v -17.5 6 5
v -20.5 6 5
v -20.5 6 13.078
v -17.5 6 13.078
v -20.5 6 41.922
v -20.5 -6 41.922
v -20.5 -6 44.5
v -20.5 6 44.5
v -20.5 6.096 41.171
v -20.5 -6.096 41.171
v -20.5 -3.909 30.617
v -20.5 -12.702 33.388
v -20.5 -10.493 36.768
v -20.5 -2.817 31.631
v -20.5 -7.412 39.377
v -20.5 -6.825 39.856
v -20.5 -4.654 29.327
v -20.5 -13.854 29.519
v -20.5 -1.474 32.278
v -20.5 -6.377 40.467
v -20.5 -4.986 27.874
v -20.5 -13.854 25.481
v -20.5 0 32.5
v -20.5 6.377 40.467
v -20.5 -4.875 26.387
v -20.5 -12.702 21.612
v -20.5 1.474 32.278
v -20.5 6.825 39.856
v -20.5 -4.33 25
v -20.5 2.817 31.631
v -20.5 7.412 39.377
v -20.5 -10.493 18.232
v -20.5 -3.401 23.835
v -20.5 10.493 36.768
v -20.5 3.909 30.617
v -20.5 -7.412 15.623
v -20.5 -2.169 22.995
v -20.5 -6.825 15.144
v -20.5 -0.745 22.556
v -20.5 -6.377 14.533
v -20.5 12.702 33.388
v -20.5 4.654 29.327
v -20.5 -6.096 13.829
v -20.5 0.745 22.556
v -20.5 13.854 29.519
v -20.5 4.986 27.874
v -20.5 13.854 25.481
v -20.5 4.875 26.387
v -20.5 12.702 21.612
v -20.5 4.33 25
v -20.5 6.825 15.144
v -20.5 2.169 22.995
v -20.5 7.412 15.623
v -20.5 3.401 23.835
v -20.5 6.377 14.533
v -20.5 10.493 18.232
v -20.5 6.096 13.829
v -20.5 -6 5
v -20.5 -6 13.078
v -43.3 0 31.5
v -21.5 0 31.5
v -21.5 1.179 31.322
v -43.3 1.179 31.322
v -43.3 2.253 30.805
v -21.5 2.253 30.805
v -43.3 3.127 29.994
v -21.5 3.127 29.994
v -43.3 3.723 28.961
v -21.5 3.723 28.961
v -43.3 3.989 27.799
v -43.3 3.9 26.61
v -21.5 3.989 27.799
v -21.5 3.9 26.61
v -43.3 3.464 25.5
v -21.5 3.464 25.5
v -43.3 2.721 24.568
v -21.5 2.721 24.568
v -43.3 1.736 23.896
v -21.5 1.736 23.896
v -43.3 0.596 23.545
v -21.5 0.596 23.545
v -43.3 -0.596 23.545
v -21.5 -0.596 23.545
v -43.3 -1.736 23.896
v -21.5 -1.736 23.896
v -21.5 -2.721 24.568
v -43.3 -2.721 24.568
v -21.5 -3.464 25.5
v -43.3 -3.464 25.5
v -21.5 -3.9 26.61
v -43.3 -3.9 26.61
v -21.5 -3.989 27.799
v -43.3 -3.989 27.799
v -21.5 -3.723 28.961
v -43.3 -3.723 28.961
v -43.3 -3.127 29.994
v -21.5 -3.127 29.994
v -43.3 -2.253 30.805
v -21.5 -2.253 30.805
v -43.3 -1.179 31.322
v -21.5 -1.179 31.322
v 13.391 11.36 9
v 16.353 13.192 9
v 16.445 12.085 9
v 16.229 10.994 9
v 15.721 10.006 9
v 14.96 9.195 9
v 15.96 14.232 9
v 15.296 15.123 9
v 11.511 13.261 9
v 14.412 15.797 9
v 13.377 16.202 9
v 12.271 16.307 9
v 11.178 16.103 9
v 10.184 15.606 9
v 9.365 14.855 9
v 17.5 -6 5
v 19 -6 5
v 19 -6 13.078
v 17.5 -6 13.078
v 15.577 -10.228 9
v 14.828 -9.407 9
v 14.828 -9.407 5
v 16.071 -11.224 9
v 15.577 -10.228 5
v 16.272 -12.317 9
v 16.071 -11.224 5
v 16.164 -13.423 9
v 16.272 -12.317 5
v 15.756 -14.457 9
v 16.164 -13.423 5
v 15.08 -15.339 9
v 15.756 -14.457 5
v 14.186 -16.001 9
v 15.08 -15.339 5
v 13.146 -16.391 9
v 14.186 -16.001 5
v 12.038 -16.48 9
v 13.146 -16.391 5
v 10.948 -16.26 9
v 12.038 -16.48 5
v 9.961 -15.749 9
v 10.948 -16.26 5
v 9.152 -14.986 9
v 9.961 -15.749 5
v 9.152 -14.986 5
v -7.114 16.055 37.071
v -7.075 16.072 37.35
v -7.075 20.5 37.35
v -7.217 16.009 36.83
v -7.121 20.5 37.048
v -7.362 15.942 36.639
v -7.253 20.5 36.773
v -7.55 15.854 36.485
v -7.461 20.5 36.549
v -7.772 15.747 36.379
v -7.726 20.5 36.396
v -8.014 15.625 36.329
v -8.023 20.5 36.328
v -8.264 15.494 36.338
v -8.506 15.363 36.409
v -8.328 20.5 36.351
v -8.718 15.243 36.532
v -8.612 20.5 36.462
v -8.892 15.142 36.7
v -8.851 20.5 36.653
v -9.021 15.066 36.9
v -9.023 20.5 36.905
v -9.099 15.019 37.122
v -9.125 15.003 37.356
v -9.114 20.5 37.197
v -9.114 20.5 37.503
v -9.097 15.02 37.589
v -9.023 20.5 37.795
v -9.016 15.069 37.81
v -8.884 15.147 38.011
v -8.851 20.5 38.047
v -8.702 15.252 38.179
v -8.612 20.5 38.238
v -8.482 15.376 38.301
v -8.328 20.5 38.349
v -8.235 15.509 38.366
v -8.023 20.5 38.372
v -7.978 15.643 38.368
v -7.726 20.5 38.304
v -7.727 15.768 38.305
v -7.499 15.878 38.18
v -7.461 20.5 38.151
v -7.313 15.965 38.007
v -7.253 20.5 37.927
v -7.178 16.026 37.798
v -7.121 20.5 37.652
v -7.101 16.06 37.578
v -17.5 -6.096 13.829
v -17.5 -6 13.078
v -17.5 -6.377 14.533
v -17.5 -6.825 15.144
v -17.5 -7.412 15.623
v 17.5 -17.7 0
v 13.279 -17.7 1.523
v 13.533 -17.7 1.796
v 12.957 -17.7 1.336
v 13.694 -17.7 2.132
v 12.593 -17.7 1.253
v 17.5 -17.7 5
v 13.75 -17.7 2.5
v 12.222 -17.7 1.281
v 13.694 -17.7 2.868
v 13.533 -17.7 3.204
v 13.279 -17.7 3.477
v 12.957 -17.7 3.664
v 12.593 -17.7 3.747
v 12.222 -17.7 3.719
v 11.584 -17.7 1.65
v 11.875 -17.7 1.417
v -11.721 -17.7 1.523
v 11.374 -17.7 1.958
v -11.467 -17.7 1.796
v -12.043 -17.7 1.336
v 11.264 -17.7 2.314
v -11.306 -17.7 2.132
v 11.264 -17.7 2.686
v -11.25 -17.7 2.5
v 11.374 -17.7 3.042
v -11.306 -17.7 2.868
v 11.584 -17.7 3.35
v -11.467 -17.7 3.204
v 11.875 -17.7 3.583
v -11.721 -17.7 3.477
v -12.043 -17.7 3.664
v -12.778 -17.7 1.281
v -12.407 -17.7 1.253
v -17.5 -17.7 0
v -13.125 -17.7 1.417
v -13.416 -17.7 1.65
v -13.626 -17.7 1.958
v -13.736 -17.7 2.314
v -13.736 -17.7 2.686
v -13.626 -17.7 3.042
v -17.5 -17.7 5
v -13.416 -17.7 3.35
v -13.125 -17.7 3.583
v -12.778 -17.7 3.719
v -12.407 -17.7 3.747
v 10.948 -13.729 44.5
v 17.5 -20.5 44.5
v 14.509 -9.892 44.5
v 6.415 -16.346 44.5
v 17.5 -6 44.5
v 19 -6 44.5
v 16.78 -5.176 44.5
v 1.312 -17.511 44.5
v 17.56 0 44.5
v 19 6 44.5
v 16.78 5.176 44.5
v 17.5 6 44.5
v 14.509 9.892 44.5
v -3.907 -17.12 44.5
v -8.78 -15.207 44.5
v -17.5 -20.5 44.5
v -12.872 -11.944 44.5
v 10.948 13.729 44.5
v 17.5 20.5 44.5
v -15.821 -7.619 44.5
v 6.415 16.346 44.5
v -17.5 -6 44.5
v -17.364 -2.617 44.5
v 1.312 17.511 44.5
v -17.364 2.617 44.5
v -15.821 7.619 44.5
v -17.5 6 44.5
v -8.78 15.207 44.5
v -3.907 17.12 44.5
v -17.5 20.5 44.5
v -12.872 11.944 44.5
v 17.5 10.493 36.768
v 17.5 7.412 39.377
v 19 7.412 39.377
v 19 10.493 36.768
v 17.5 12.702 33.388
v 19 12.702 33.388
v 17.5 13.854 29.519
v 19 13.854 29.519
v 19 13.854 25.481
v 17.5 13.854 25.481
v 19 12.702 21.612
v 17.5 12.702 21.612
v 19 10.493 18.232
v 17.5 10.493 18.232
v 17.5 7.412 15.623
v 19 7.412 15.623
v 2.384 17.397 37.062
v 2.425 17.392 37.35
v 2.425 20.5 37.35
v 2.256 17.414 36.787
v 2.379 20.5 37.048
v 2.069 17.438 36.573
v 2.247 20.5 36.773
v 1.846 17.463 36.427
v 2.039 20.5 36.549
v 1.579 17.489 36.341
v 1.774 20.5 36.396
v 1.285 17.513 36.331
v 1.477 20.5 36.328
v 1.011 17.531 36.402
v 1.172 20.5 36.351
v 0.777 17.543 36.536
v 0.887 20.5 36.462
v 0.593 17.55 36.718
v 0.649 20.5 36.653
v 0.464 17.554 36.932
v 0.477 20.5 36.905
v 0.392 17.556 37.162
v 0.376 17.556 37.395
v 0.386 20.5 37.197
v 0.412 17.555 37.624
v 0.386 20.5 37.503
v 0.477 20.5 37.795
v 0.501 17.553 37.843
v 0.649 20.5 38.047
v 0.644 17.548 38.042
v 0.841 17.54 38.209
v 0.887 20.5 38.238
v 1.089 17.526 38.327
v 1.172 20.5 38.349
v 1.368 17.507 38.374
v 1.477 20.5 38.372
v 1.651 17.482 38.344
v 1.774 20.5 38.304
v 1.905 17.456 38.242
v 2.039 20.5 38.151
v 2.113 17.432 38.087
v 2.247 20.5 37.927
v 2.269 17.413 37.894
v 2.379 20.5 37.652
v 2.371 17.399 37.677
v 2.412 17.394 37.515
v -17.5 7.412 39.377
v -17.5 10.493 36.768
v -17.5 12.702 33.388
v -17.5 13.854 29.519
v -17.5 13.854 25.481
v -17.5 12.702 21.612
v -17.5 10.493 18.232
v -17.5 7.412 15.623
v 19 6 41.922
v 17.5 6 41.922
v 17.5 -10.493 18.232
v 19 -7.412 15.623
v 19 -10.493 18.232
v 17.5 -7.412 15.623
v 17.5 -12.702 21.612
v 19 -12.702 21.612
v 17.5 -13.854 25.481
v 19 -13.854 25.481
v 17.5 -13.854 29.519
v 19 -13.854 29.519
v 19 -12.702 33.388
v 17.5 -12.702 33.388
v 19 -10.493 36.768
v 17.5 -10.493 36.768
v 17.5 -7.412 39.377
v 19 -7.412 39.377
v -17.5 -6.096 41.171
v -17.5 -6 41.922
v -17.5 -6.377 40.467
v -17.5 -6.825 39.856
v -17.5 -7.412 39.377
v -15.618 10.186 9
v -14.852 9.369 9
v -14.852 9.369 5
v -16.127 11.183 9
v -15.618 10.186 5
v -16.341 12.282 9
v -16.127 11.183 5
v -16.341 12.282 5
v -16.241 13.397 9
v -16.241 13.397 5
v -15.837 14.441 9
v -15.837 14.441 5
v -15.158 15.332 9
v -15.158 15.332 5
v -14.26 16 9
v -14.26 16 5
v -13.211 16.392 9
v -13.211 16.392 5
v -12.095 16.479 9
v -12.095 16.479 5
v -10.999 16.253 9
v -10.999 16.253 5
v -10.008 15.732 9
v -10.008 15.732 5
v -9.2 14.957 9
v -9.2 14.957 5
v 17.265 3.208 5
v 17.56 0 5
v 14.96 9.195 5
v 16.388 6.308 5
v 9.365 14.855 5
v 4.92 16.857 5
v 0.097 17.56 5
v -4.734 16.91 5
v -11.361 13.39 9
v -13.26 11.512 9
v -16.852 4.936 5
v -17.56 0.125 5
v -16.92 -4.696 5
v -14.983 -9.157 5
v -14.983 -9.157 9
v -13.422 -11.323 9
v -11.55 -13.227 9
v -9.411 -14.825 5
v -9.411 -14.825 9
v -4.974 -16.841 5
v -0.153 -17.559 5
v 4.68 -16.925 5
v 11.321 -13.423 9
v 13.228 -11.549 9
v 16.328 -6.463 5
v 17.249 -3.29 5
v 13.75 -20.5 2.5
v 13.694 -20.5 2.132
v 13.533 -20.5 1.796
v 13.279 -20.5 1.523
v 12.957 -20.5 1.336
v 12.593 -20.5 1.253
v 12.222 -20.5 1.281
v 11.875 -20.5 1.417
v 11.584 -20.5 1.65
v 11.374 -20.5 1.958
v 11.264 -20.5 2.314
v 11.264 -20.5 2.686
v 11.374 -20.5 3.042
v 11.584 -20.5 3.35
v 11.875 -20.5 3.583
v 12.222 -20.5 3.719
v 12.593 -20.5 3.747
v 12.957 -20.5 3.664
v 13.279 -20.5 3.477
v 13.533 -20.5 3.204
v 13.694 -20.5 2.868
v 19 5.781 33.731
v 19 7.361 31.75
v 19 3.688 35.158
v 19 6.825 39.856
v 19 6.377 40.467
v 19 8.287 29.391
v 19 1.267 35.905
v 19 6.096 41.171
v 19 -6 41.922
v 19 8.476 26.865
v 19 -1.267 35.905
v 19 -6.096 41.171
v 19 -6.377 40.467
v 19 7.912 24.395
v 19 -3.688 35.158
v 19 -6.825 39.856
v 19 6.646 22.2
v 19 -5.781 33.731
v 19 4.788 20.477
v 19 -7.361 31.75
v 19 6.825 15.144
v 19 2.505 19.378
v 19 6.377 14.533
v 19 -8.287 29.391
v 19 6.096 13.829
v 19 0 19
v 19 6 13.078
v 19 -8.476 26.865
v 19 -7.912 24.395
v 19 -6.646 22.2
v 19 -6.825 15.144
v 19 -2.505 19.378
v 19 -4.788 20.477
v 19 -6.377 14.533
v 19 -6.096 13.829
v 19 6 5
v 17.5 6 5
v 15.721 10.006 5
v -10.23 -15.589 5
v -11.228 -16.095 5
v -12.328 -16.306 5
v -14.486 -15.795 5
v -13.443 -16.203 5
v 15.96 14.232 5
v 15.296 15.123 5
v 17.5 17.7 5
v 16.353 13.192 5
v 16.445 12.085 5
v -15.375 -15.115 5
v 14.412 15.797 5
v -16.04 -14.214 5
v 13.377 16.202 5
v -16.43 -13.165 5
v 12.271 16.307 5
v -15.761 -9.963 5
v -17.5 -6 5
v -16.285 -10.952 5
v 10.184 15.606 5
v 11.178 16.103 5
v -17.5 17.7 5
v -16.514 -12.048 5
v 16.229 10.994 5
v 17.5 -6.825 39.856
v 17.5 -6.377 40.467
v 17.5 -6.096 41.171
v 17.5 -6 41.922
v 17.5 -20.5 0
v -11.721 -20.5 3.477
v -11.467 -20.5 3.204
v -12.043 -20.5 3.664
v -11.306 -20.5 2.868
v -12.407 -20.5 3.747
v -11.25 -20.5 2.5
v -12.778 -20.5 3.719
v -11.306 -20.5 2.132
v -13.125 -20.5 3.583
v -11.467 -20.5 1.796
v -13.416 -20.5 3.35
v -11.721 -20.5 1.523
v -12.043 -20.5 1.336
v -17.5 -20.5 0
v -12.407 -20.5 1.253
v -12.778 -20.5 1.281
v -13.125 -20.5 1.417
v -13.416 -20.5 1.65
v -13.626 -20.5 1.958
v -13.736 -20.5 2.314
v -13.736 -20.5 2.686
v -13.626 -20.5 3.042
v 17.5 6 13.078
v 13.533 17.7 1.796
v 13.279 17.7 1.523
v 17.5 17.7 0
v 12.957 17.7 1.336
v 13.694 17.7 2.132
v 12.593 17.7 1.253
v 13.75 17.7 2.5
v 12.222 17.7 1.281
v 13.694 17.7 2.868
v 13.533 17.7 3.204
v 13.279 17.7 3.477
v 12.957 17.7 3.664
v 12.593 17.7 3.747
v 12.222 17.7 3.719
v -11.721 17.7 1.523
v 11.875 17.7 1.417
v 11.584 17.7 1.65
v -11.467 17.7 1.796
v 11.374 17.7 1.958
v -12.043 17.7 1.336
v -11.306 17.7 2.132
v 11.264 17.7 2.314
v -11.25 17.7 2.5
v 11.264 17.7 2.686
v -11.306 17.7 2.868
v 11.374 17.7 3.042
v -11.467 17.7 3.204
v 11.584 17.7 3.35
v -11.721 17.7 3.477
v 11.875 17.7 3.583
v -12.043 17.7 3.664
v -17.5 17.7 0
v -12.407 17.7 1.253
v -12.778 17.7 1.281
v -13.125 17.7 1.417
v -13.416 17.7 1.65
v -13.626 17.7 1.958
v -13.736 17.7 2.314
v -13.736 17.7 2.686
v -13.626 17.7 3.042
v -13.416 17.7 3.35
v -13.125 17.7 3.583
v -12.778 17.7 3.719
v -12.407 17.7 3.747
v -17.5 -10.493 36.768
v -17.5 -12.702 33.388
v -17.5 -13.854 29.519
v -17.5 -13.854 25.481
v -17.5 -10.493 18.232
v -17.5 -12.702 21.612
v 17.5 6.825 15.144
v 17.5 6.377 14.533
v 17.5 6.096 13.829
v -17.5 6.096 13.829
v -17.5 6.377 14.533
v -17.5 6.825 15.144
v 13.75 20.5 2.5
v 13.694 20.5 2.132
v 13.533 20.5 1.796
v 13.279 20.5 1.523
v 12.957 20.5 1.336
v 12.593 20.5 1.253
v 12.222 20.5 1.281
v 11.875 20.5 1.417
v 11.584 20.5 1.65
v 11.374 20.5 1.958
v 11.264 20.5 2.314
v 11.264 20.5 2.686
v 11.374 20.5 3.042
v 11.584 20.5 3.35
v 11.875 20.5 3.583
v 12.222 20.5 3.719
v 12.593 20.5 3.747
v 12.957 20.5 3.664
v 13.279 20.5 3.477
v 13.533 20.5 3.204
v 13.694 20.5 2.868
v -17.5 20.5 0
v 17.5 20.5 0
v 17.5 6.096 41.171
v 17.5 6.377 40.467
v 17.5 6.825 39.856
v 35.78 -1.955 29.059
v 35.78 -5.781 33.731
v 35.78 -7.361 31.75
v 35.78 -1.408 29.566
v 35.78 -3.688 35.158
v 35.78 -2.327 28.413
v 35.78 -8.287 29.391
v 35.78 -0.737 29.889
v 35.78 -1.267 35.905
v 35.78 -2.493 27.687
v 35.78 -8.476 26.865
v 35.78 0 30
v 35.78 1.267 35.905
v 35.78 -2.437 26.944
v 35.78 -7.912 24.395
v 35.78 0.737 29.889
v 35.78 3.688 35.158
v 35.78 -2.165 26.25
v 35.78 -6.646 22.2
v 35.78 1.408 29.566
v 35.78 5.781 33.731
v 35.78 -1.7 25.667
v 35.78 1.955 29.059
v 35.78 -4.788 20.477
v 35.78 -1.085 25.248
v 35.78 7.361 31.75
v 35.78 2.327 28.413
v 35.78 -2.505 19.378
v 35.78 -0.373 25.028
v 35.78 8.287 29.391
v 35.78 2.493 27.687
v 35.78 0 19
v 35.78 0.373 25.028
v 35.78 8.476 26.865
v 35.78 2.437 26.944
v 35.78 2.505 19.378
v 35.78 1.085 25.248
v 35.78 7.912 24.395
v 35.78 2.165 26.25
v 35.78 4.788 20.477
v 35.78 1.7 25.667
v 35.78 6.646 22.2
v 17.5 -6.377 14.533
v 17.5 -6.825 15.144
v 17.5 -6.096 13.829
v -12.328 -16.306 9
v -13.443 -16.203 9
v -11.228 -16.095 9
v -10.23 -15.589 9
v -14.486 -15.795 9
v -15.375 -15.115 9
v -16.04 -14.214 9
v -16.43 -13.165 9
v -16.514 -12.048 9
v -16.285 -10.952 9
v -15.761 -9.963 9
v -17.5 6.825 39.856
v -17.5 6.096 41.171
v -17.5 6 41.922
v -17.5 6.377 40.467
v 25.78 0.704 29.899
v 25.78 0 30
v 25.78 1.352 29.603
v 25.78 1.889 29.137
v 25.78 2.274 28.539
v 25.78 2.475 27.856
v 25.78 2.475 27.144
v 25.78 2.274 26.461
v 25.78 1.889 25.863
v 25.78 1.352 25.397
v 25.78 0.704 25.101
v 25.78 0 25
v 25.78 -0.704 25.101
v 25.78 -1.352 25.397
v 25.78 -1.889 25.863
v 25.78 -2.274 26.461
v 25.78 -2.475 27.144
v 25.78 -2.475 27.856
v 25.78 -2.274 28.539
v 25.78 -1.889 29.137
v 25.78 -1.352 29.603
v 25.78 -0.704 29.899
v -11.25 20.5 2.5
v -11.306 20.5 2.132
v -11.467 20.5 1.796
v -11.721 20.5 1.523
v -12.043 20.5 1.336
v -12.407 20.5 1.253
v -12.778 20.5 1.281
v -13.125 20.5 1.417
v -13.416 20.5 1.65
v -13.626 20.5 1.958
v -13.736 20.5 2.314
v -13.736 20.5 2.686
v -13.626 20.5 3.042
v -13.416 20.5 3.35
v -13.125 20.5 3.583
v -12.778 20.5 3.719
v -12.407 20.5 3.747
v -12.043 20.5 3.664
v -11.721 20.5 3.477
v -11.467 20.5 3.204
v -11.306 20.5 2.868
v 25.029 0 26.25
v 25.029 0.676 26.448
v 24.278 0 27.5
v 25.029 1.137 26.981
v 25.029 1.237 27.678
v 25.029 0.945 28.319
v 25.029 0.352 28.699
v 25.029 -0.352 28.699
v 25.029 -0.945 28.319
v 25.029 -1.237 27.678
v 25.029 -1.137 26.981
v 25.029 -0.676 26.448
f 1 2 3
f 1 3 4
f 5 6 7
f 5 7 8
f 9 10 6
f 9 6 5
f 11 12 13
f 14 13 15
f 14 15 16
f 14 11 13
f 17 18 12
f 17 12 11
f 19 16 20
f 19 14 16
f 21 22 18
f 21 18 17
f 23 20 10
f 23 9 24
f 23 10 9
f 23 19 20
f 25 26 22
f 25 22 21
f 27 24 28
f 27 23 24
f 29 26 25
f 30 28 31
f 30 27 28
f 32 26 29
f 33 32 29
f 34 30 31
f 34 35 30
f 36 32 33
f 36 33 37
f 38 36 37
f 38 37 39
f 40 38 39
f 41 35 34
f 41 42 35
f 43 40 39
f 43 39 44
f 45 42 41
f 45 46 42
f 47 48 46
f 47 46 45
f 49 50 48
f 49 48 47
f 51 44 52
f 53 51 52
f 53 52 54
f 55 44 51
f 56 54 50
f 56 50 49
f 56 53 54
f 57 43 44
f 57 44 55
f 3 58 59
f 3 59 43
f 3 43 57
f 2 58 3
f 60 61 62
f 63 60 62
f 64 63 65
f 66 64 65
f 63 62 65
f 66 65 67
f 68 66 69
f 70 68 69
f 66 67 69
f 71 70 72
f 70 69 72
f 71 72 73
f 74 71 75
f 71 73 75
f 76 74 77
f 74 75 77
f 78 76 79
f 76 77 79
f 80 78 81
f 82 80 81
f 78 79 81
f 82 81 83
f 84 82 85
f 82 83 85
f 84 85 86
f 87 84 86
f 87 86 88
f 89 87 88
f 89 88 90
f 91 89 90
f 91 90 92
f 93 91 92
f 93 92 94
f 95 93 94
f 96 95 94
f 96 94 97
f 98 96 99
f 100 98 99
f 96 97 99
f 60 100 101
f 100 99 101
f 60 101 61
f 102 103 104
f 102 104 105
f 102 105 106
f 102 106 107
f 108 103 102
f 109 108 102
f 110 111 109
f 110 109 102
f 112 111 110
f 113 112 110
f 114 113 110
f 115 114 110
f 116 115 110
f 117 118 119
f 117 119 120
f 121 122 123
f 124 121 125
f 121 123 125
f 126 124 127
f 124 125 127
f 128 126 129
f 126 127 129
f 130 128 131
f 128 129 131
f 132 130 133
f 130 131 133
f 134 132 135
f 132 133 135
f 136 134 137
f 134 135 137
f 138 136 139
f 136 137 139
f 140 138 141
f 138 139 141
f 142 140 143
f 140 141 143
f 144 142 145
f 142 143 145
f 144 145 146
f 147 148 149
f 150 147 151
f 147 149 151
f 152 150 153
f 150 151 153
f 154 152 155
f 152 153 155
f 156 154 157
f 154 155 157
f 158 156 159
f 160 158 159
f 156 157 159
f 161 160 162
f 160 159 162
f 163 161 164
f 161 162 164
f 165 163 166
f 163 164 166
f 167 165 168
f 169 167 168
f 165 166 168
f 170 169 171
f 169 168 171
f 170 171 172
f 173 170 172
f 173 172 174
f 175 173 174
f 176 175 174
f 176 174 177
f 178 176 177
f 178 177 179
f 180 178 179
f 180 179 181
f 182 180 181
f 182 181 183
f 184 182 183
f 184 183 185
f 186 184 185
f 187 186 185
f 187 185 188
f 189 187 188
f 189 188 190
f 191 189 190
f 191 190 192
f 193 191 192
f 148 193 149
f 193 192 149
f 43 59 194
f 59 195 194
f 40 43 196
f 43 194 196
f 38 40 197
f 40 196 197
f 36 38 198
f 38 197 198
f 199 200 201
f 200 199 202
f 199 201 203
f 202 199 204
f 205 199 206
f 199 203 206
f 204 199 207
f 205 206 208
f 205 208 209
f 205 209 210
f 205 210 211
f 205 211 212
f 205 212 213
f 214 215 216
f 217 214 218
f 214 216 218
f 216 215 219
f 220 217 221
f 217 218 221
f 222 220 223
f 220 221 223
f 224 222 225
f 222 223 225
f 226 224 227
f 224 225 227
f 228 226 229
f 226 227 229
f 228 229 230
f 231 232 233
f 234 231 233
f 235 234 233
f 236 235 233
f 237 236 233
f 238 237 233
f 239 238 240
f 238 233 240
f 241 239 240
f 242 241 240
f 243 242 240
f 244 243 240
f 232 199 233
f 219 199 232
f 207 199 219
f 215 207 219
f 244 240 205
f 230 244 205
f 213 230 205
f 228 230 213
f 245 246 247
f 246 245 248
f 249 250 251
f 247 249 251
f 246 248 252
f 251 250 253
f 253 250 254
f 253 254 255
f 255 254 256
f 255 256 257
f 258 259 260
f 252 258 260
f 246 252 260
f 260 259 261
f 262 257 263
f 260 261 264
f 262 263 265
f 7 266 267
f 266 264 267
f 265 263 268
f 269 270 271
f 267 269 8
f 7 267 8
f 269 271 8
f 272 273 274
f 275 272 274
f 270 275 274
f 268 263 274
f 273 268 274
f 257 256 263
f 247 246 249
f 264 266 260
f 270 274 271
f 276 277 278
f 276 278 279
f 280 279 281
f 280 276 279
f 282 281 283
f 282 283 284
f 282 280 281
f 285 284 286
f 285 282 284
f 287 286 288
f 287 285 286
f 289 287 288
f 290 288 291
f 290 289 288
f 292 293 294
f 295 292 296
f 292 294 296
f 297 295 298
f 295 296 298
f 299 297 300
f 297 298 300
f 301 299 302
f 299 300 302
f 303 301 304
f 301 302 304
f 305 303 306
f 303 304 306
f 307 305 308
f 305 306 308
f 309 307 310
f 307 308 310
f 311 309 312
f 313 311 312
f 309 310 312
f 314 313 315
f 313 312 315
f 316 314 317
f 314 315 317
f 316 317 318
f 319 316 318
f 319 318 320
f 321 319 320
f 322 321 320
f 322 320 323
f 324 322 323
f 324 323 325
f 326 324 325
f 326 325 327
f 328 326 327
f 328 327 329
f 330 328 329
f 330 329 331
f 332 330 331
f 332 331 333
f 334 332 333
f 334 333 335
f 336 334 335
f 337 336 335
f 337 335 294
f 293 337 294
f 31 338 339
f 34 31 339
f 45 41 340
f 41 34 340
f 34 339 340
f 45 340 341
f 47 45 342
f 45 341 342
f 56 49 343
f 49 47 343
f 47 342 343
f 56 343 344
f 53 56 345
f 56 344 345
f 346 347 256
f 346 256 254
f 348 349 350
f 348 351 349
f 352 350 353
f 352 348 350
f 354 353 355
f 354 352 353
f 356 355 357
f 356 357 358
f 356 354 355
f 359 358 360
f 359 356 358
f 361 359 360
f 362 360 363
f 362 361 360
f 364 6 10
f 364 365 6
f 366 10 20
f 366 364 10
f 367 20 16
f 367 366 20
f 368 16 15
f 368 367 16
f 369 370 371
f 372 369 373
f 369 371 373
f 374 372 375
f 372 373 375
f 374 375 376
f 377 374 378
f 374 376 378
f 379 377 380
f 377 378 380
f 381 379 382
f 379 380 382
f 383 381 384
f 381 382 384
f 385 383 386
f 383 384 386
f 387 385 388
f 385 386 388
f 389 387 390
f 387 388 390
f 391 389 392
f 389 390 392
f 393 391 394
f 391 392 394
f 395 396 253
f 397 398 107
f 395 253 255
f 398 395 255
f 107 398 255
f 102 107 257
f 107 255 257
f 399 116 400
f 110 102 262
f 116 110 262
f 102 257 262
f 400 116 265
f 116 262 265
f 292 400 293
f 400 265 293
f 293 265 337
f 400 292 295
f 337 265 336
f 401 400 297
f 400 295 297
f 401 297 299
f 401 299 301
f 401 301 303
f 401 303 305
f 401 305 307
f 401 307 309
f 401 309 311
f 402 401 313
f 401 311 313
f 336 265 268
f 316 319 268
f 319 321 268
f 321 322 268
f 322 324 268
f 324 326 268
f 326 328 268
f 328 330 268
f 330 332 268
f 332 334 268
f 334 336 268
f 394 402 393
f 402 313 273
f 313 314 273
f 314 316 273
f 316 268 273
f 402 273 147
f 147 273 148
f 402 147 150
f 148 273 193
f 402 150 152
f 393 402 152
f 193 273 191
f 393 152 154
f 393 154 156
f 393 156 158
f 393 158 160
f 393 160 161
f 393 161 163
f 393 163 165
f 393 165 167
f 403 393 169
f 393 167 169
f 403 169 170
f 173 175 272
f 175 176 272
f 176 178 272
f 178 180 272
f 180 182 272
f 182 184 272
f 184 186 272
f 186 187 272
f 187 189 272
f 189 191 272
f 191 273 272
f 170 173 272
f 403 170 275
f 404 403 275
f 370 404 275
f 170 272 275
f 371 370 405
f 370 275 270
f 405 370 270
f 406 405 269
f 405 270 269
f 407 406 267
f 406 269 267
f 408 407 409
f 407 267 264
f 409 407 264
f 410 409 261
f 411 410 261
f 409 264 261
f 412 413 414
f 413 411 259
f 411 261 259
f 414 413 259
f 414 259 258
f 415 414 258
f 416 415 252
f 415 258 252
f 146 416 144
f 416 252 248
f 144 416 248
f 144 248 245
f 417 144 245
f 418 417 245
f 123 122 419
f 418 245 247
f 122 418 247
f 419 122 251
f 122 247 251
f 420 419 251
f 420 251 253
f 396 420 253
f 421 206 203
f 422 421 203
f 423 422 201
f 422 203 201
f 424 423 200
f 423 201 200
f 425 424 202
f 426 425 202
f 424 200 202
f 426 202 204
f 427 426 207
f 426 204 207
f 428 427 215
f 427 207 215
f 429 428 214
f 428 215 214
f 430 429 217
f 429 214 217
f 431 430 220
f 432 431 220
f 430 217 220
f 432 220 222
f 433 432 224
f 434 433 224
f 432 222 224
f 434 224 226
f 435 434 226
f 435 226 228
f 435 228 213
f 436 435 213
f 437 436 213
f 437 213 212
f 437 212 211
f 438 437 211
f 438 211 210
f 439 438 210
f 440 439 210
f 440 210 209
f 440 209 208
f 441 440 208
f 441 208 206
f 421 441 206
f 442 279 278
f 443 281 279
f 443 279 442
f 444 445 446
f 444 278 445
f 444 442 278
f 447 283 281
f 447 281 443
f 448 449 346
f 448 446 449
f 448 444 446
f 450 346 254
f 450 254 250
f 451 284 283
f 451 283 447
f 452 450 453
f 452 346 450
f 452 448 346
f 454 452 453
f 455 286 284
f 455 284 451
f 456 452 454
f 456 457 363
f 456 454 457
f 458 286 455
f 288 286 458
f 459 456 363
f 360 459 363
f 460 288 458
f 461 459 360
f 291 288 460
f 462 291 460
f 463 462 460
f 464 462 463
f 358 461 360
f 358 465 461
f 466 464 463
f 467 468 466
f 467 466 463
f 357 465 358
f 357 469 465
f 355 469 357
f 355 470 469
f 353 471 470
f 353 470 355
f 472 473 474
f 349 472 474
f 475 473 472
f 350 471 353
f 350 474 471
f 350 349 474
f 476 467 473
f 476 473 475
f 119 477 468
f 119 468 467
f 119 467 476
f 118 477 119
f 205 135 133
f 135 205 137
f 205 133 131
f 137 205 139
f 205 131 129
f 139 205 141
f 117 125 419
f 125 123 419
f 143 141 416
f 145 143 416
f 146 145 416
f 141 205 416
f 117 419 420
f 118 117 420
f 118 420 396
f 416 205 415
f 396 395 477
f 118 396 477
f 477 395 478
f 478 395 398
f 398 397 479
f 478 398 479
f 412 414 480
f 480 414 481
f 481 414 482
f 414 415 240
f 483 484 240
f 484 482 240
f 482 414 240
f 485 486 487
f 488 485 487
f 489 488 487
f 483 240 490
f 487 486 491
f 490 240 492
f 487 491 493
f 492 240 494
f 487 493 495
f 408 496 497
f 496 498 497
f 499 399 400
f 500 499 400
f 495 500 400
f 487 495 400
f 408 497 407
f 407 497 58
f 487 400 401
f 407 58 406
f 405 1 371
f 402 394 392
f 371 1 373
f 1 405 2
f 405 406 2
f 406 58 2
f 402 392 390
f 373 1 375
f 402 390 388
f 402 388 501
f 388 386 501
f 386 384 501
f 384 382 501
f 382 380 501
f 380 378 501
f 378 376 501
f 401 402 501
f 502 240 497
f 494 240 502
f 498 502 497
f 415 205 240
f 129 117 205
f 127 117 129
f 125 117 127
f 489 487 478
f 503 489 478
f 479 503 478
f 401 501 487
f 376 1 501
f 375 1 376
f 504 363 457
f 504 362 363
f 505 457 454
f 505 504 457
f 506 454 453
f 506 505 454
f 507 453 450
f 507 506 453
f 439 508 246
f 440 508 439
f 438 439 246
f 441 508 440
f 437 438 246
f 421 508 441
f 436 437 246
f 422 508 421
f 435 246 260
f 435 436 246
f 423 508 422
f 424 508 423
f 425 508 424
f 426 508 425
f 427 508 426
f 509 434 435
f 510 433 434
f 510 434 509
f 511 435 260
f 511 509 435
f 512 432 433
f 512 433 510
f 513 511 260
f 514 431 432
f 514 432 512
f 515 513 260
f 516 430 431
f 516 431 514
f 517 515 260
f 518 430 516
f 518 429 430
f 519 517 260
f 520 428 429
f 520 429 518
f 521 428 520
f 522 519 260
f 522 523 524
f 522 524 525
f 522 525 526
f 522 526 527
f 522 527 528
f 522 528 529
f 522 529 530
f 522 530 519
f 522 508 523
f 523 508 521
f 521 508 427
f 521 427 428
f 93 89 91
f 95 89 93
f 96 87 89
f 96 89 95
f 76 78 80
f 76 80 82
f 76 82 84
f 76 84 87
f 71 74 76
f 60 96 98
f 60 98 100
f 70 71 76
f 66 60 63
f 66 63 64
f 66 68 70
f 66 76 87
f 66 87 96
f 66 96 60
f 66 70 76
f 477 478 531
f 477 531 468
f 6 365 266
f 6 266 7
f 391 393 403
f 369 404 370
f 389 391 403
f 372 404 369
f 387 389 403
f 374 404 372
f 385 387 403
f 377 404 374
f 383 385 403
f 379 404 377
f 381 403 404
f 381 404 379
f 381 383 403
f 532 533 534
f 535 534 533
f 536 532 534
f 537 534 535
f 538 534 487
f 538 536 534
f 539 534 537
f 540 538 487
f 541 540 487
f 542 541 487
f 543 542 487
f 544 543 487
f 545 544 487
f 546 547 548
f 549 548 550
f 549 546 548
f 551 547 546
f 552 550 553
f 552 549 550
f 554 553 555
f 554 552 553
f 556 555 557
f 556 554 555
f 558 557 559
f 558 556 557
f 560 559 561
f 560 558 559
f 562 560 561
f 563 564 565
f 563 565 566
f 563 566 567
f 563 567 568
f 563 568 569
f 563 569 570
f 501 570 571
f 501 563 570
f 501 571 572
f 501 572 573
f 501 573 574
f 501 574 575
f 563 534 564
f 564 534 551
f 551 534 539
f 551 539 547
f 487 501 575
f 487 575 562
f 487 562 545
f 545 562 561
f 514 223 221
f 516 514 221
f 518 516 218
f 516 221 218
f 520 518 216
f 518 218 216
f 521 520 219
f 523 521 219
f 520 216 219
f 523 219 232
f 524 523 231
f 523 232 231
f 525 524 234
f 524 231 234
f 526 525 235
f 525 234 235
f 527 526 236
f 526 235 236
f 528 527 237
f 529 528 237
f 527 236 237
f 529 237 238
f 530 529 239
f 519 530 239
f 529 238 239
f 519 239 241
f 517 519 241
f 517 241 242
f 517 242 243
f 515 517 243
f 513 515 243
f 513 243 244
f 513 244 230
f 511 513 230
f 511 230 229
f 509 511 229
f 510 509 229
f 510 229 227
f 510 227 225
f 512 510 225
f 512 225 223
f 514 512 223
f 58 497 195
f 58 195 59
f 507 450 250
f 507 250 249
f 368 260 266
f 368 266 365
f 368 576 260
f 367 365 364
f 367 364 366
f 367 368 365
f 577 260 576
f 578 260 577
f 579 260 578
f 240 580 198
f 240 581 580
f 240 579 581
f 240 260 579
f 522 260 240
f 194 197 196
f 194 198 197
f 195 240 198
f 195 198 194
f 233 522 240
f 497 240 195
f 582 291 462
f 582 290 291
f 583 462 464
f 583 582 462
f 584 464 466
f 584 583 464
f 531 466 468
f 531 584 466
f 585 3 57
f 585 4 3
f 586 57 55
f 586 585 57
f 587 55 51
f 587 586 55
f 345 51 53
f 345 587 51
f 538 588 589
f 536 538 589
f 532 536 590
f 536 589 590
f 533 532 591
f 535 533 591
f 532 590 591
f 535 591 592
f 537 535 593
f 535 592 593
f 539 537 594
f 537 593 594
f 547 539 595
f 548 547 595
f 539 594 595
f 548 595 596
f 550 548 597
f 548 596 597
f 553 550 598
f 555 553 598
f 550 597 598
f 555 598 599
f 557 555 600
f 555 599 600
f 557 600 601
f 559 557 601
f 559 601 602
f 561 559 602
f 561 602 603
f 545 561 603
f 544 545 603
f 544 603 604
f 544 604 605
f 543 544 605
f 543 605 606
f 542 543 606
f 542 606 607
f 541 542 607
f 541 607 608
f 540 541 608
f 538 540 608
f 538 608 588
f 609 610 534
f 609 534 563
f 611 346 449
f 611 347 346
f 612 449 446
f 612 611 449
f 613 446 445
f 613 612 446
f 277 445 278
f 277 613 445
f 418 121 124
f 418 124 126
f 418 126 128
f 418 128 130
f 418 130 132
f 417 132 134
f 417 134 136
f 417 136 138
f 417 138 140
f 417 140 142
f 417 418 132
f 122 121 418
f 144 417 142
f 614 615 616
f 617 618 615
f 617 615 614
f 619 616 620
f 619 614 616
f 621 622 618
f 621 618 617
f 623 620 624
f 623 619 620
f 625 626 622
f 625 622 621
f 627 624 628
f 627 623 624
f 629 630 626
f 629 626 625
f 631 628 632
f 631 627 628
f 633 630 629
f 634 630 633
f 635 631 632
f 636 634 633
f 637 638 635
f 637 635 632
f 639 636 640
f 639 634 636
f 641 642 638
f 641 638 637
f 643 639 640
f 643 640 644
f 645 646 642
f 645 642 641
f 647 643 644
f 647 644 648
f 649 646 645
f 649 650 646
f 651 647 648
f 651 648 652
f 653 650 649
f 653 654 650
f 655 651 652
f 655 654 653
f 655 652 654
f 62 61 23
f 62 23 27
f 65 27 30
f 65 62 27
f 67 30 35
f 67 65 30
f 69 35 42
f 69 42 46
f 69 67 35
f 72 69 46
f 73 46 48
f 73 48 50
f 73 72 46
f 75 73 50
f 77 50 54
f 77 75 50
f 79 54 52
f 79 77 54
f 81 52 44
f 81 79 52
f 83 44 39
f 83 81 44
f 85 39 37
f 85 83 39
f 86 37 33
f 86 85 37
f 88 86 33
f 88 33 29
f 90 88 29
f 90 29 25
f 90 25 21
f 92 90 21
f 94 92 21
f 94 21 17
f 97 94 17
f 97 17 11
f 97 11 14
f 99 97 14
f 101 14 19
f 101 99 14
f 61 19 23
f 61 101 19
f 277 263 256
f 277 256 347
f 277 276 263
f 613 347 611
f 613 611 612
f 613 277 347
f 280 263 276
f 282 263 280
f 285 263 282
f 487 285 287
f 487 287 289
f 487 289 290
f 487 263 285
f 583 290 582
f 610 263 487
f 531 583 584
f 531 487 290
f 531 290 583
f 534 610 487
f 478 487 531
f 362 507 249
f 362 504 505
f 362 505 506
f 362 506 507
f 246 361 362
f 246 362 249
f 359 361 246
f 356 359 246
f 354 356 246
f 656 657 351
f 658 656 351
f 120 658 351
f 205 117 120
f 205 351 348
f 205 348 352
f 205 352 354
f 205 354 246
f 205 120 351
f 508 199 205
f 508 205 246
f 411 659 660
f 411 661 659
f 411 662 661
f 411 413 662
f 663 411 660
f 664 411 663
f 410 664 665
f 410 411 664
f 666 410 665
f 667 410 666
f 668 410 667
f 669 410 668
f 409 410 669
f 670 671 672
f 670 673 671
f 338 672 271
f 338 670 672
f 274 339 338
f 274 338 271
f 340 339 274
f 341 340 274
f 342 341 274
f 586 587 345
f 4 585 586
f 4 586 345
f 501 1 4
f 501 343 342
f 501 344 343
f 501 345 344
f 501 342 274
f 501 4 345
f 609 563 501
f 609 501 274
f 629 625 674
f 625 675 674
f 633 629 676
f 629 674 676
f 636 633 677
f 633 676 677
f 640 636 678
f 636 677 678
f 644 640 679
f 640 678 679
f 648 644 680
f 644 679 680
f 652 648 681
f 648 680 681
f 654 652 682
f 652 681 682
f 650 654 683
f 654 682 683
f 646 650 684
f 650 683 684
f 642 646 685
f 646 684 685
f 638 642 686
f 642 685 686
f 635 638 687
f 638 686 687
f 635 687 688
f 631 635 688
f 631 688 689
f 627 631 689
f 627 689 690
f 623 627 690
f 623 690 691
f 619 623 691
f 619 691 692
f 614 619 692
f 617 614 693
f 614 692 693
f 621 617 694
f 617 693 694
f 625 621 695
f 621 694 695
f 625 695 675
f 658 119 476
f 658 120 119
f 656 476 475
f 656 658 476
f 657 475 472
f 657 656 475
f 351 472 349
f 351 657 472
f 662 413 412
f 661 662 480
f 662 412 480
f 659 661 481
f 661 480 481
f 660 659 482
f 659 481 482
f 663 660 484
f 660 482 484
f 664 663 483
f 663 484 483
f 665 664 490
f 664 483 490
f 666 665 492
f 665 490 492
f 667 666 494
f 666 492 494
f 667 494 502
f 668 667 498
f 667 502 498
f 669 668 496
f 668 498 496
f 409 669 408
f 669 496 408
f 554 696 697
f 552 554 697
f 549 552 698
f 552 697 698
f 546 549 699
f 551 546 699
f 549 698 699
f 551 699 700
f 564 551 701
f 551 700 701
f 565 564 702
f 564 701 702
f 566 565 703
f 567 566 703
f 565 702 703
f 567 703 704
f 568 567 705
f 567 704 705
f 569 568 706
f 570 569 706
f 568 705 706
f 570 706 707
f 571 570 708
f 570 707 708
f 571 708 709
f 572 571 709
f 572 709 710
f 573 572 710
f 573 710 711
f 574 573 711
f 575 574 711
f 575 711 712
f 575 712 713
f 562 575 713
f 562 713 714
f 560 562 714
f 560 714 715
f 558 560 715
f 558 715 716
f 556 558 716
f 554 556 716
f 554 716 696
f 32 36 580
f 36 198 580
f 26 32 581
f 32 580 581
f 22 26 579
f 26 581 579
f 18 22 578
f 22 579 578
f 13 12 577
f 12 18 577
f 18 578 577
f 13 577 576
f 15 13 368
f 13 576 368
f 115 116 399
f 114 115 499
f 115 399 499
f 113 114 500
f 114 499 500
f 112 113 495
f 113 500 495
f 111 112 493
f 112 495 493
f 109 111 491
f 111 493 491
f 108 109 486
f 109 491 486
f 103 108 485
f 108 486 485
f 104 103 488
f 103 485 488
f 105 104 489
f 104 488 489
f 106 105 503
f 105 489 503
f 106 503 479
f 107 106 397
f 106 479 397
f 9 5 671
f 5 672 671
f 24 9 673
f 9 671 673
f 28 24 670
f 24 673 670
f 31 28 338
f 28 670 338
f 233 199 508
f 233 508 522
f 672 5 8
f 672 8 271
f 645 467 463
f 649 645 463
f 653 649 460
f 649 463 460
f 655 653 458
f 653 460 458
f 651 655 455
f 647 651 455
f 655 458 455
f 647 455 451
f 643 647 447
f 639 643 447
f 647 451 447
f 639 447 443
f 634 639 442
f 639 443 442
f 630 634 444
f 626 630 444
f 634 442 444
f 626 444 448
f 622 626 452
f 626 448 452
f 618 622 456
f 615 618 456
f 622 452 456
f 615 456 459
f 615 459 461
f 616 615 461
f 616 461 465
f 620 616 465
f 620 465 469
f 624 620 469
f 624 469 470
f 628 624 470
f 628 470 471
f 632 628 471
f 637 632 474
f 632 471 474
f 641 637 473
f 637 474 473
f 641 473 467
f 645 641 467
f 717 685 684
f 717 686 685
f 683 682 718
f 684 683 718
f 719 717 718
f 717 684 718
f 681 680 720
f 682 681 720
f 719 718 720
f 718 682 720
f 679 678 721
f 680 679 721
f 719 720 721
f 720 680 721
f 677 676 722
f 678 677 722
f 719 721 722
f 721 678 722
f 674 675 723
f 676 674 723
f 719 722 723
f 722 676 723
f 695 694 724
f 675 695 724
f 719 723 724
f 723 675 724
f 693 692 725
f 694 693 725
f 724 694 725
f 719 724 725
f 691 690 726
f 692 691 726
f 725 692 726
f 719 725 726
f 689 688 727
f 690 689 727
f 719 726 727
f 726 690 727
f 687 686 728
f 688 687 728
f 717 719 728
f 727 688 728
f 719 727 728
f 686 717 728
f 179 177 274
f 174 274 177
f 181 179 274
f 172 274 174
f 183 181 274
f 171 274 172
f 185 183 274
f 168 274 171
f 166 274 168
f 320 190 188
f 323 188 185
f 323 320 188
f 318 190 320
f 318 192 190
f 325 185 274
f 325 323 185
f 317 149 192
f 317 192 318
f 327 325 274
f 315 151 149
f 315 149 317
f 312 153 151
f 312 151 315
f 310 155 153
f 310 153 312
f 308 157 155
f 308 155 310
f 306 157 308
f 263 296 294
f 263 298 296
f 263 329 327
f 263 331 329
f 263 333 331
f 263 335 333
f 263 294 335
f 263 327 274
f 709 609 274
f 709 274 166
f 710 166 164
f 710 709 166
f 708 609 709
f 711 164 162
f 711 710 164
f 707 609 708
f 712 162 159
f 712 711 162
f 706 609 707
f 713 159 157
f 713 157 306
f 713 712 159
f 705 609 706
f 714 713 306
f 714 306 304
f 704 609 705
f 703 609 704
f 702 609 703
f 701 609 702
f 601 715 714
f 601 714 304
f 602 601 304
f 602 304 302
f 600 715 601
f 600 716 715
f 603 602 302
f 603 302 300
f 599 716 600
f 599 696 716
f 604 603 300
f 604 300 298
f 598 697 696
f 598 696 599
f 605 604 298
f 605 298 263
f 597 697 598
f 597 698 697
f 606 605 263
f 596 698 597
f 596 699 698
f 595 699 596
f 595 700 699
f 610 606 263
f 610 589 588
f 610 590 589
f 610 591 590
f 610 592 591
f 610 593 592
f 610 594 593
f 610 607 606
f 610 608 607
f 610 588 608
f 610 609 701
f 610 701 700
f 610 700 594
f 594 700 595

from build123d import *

# Parameters (mm, degrees)
BOSS_EXTRUDE1_DEPTH             = 44.5
BOSS_EXTRUDE2_REACH             = 63.096
SKETCH3_R                       = 14
BOSS_EXTRUDE2_DIRECTION_2_REACH = 63.096
SKETCH5_R                       = 17.56
CUT_EXTRUDE2_DEPTH              = 54.110733378
SKETCH6_W                       = 5
SKETCH6_H                       = 35.4
CUT_EXTRUDE3_DEPTH              = 63.934489749
FILLET1_R                       = 3
SKETCH7_R                       = 8.5
BOSS_EXTRUDE4_DEPTH             = 16.78
SKETCH8_R                       = 4
BOSS_EXTRUDE5_DEPTH             = 22.8
CHAMFER1_SIZE                   = 1
M3X0_5_TAPPED_HOLE1_D           = 2.5
M2_5X0_45_TAPPED_HOLE1_REACH    = 76.405
M2_5X0_45_TAPPED_HOLE1_BORE_R   = 1.025
M6X1_0_TAPPED_HOLE1_D           = 5
M6X1_0_TAPPED_HOLE1_DEPTH       = 10
M6X1_0_TAPPED_HOLE1_TIP         = 1.502151548
SKETCH16_R                      = 4
CUT_EXTRUDE4_DEPTH              = 4


with BuildPart() as part:
    # Sketch1 → Boss-Extrude1 (new body)
    with BuildSketch(Plane.XY):
        Polygon((-17.5, 20.5), (17.5, 20.5), (17.5, 6), (19, 6), (19, -6), (17.5, -6), (17.5, -20.5), (-17.5, -20.5), (-17.5, -6), (-20.5, -6), (-20.5, 6), (-17.5, 6), align=None)
    extrude(amount=BOSS_EXTRUDE1_DEPTH)

    # Boss-Extrude2: up to this face of the body (flat: up to its plane)
    boss_extrude2_end = Plane(part.part.faces().sort_by_distance((-20.5, 0, 22.25))[0])
    # Sketch3 → Boss-Extrude2 (add, up to the picked face)
    with BuildSketch(Plane.ZY.offset(17.5), mode=Mode.PRIVATE) as boss_extrude2_sk1:
        with Locations((27.5, 0)):
            Circle(SKETCH3_R)
    boss_extrude2_tool1 = split(extrude(boss_extrude2_sk1.sketch, amount=BOSS_EXTRUDE2_REACH, mode=Mode.PRIVATE), bisect_by=boss_extrude2_end, keep=Keep.BOTH, mode=Mode.PRIVATE)
    add(boss_extrude2_tool1.solids().sort_by(Axis((-17.5, 0, 27.5), (-1, 0, 0)))[0])

    # Boss-Extrude2 direction 2: up to this face of the body (flat: up to its plane)
    boss_extrude2_direction_2_end = Plane(part.part.faces().sort_by_distance((19, 0, 22.25))[0])
    # Sketch3 → Boss-Extrude2 direction 2 (add, up to the picked face)
    with BuildSketch(Plane.ZY.offset(17.5), mode=Mode.PRIVATE) as boss_extrude2_direction_2_sk1:
        with Locations((27.5, 0)):
            Circle(SKETCH3_R)
    boss_extrude2_direction_2_tool1 = split(extrude(boss_extrude2_direction_2_sk1.sketch, amount=-BOSS_EXTRUDE2_DIRECTION_2_REACH, mode=Mode.PRIVATE), bisect_by=boss_extrude2_direction_2_end, keep=Keep.BOTH, mode=Mode.PRIVATE)
    add(boss_extrude2_direction_2_tool1.solids().sort_by(Axis((-17.5, 0, 27.5), (1, 0, 0)))[0])

    # Sketch5 → Cut-Extrude2 (cut, through all)
    with BuildSketch(Plane.XY.offset(44.5)):
        Circle(SKETCH5_R)
    extrude(amount=-CUT_EXTRUDE2_DEPTH, mode=Mode.SUBTRACT)

    # Sketch6 → Cut-Extrude3 (cut, through all)
    with BuildSketch(Plane.ZY.offset(20.5)):
        with Locations((2.5, 0)):
            Rectangle(SKETCH6_W, SKETCH6_H)
    extrude(amount=-CUT_EXTRUDE3_DEPTH, mode=Mode.SUBTRACT)

    # Fillet1
    fillet1_edges = [part.edges().sort_by_distance(p)[0] for p in [
        (18.25, -6, 40.149110641),
        (18.25, -6, 14.850889359),
        (18.25, 6, 14.850889359),
        (18.25, 6, 40.149110641),
        (-19, 6, 14.850889359),
        (-19, 6, 40.149110641),
        (-19, -6, 40.149110641),
        (-19, -6, 14.850889359),
    ]]
    fillet(fillet1_edges, radius=FILLET1_R)

    # Sketch7 → Boss-Extrude4 (add)
    with BuildSketch(Plane(origin=(19, 0, 0), x_dir=(0, 0, -1), z_dir=(1, 0, 0))):
        with Locations((-27.5, 0)):
            Circle(SKETCH7_R)
    extrude(amount=BOSS_EXTRUDE4_DEPTH)

    # Sketch8 → Boss-Extrude5 (add)
    with BuildSketch(Plane.ZY.offset(20.5)):
        with Locations((27.5, 0)):
            Circle(SKETCH8_R)
    extrude(amount=BOSS_EXTRUDE5_DEPTH)

    # Chamfer1
    chamfer1_edges = [part.edges().sort_by_distance(p)[0] for p in [
        (-20.5, 0, 23.5),
    ]]
    chamfer(chamfer1_edges, length=CHAMFER1_SIZE)

    # M3x0.5 Tapped Hole1 (through all)
    with Locations(Plane(origin=(0, -20.5, 0), x_dir=(-1, 0, 0), z_dir=(0, -1, 0))):
        with Locations((-12.5, -2.5), (12.5, -2.5)):
            Hole(M3X0_5_TAPPED_HOLE1_D / 2)

    # M2.5x0.45 Tapped Hole1 bore → M2.5x0.45 Tapped Hole1 (cut, up to next)
    with BuildSketch(Plane(origin=(0, 20.5, 0), x_dir=(1, 0, 0), z_dir=(0, 1, 0)), mode=Mode.PRIVATE) as m2_5x0_45_tapped_hole1_sk1:
        with Locations((-8.1, -37.35)):
            Circle(M2_5X0_45_TAPPED_HOLE1_BORE_R)
    m2_5x0_45_tapped_hole1_tool1 = extrude(m2_5x0_45_tapped_hole1_sk1.sketch, amount=-M2_5X0_45_TAPPED_HOLE1_REACH, mode=Mode.PRIVATE) & part.part
    # M2.5x0.45 Tapped Hole1 bore → M2.5x0.45 Tapped Hole1 (cut, up to next)
    with BuildSketch(Plane(origin=(0, 20.5, 0), x_dir=(1, 0, 0), z_dir=(0, 1, 0)), mode=Mode.PRIVATE) as m2_5x0_45_tapped_hole1_sk2:
        with Locations((1.4, -37.35)):
            Circle(M2_5X0_45_TAPPED_HOLE1_BORE_R)
    m2_5x0_45_tapped_hole1_tool2 = extrude(m2_5x0_45_tapped_hole1_sk2.sketch, amount=-M2_5X0_45_TAPPED_HOLE1_REACH, mode=Mode.PRIVATE) & part.part
    add(m2_5x0_45_tapped_hole1_tool1.solids().sort_by_distance((-8.1, 20.5, 37.35))[0], mode=Mode.SUBTRACT)
    add(m2_5x0_45_tapped_hole1_tool2.solids().sort_by_distance((1.4, 20.5, 37.35))[0], mode=Mode.SUBTRACT)

    # M6x1.0 Tapped Hole1
    with Locations(Plane(origin=(35.78, 0, 0), x_dir=(0, 0, -1), z_dir=(1, 0, 0))):
        with Locations((-27.5, 0)):
            Hole(M6X1_0_TAPPED_HOLE1_D / 2, depth=M6X1_0_TAPPED_HOLE1_DEPTH)
            with Locations((0, 0, -(M6X1_0_TAPPED_HOLE1_DEPTH + M6X1_0_TAPPED_HOLE1_TIP / 2))):  # 118° drill point
                Cone(0, M6X1_0_TAPPED_HOLE1_D / 2, M6X1_0_TAPPED_HOLE1_TIP, mode=Mode.SUBTRACT)

    # Sketch16 → Cut-Extrude4 (cut)
    with BuildSketch(Plane(origin=(0, 0, 5), x_dir=(-1, 0, 0), z_dir=(0, 0, -1))):
        with Locations((12.346045823, 12.48714349)):
            Circle(SKETCH16_R)
        with Locations((12.522297379, -12.310490175)):
            Circle(SKETCH16_R)
        with Locations((-12.275336286, -12.486741731)):
            Circle(SKETCH16_R)
        with Locations((-12.451587842, 12.310891934)):
            Circle(SKETCH16_R)
    extrude(amount=-CUT_EXTRUDE4_DEPTH, mode=Mode.SUBTRACT)


solid = part.part
